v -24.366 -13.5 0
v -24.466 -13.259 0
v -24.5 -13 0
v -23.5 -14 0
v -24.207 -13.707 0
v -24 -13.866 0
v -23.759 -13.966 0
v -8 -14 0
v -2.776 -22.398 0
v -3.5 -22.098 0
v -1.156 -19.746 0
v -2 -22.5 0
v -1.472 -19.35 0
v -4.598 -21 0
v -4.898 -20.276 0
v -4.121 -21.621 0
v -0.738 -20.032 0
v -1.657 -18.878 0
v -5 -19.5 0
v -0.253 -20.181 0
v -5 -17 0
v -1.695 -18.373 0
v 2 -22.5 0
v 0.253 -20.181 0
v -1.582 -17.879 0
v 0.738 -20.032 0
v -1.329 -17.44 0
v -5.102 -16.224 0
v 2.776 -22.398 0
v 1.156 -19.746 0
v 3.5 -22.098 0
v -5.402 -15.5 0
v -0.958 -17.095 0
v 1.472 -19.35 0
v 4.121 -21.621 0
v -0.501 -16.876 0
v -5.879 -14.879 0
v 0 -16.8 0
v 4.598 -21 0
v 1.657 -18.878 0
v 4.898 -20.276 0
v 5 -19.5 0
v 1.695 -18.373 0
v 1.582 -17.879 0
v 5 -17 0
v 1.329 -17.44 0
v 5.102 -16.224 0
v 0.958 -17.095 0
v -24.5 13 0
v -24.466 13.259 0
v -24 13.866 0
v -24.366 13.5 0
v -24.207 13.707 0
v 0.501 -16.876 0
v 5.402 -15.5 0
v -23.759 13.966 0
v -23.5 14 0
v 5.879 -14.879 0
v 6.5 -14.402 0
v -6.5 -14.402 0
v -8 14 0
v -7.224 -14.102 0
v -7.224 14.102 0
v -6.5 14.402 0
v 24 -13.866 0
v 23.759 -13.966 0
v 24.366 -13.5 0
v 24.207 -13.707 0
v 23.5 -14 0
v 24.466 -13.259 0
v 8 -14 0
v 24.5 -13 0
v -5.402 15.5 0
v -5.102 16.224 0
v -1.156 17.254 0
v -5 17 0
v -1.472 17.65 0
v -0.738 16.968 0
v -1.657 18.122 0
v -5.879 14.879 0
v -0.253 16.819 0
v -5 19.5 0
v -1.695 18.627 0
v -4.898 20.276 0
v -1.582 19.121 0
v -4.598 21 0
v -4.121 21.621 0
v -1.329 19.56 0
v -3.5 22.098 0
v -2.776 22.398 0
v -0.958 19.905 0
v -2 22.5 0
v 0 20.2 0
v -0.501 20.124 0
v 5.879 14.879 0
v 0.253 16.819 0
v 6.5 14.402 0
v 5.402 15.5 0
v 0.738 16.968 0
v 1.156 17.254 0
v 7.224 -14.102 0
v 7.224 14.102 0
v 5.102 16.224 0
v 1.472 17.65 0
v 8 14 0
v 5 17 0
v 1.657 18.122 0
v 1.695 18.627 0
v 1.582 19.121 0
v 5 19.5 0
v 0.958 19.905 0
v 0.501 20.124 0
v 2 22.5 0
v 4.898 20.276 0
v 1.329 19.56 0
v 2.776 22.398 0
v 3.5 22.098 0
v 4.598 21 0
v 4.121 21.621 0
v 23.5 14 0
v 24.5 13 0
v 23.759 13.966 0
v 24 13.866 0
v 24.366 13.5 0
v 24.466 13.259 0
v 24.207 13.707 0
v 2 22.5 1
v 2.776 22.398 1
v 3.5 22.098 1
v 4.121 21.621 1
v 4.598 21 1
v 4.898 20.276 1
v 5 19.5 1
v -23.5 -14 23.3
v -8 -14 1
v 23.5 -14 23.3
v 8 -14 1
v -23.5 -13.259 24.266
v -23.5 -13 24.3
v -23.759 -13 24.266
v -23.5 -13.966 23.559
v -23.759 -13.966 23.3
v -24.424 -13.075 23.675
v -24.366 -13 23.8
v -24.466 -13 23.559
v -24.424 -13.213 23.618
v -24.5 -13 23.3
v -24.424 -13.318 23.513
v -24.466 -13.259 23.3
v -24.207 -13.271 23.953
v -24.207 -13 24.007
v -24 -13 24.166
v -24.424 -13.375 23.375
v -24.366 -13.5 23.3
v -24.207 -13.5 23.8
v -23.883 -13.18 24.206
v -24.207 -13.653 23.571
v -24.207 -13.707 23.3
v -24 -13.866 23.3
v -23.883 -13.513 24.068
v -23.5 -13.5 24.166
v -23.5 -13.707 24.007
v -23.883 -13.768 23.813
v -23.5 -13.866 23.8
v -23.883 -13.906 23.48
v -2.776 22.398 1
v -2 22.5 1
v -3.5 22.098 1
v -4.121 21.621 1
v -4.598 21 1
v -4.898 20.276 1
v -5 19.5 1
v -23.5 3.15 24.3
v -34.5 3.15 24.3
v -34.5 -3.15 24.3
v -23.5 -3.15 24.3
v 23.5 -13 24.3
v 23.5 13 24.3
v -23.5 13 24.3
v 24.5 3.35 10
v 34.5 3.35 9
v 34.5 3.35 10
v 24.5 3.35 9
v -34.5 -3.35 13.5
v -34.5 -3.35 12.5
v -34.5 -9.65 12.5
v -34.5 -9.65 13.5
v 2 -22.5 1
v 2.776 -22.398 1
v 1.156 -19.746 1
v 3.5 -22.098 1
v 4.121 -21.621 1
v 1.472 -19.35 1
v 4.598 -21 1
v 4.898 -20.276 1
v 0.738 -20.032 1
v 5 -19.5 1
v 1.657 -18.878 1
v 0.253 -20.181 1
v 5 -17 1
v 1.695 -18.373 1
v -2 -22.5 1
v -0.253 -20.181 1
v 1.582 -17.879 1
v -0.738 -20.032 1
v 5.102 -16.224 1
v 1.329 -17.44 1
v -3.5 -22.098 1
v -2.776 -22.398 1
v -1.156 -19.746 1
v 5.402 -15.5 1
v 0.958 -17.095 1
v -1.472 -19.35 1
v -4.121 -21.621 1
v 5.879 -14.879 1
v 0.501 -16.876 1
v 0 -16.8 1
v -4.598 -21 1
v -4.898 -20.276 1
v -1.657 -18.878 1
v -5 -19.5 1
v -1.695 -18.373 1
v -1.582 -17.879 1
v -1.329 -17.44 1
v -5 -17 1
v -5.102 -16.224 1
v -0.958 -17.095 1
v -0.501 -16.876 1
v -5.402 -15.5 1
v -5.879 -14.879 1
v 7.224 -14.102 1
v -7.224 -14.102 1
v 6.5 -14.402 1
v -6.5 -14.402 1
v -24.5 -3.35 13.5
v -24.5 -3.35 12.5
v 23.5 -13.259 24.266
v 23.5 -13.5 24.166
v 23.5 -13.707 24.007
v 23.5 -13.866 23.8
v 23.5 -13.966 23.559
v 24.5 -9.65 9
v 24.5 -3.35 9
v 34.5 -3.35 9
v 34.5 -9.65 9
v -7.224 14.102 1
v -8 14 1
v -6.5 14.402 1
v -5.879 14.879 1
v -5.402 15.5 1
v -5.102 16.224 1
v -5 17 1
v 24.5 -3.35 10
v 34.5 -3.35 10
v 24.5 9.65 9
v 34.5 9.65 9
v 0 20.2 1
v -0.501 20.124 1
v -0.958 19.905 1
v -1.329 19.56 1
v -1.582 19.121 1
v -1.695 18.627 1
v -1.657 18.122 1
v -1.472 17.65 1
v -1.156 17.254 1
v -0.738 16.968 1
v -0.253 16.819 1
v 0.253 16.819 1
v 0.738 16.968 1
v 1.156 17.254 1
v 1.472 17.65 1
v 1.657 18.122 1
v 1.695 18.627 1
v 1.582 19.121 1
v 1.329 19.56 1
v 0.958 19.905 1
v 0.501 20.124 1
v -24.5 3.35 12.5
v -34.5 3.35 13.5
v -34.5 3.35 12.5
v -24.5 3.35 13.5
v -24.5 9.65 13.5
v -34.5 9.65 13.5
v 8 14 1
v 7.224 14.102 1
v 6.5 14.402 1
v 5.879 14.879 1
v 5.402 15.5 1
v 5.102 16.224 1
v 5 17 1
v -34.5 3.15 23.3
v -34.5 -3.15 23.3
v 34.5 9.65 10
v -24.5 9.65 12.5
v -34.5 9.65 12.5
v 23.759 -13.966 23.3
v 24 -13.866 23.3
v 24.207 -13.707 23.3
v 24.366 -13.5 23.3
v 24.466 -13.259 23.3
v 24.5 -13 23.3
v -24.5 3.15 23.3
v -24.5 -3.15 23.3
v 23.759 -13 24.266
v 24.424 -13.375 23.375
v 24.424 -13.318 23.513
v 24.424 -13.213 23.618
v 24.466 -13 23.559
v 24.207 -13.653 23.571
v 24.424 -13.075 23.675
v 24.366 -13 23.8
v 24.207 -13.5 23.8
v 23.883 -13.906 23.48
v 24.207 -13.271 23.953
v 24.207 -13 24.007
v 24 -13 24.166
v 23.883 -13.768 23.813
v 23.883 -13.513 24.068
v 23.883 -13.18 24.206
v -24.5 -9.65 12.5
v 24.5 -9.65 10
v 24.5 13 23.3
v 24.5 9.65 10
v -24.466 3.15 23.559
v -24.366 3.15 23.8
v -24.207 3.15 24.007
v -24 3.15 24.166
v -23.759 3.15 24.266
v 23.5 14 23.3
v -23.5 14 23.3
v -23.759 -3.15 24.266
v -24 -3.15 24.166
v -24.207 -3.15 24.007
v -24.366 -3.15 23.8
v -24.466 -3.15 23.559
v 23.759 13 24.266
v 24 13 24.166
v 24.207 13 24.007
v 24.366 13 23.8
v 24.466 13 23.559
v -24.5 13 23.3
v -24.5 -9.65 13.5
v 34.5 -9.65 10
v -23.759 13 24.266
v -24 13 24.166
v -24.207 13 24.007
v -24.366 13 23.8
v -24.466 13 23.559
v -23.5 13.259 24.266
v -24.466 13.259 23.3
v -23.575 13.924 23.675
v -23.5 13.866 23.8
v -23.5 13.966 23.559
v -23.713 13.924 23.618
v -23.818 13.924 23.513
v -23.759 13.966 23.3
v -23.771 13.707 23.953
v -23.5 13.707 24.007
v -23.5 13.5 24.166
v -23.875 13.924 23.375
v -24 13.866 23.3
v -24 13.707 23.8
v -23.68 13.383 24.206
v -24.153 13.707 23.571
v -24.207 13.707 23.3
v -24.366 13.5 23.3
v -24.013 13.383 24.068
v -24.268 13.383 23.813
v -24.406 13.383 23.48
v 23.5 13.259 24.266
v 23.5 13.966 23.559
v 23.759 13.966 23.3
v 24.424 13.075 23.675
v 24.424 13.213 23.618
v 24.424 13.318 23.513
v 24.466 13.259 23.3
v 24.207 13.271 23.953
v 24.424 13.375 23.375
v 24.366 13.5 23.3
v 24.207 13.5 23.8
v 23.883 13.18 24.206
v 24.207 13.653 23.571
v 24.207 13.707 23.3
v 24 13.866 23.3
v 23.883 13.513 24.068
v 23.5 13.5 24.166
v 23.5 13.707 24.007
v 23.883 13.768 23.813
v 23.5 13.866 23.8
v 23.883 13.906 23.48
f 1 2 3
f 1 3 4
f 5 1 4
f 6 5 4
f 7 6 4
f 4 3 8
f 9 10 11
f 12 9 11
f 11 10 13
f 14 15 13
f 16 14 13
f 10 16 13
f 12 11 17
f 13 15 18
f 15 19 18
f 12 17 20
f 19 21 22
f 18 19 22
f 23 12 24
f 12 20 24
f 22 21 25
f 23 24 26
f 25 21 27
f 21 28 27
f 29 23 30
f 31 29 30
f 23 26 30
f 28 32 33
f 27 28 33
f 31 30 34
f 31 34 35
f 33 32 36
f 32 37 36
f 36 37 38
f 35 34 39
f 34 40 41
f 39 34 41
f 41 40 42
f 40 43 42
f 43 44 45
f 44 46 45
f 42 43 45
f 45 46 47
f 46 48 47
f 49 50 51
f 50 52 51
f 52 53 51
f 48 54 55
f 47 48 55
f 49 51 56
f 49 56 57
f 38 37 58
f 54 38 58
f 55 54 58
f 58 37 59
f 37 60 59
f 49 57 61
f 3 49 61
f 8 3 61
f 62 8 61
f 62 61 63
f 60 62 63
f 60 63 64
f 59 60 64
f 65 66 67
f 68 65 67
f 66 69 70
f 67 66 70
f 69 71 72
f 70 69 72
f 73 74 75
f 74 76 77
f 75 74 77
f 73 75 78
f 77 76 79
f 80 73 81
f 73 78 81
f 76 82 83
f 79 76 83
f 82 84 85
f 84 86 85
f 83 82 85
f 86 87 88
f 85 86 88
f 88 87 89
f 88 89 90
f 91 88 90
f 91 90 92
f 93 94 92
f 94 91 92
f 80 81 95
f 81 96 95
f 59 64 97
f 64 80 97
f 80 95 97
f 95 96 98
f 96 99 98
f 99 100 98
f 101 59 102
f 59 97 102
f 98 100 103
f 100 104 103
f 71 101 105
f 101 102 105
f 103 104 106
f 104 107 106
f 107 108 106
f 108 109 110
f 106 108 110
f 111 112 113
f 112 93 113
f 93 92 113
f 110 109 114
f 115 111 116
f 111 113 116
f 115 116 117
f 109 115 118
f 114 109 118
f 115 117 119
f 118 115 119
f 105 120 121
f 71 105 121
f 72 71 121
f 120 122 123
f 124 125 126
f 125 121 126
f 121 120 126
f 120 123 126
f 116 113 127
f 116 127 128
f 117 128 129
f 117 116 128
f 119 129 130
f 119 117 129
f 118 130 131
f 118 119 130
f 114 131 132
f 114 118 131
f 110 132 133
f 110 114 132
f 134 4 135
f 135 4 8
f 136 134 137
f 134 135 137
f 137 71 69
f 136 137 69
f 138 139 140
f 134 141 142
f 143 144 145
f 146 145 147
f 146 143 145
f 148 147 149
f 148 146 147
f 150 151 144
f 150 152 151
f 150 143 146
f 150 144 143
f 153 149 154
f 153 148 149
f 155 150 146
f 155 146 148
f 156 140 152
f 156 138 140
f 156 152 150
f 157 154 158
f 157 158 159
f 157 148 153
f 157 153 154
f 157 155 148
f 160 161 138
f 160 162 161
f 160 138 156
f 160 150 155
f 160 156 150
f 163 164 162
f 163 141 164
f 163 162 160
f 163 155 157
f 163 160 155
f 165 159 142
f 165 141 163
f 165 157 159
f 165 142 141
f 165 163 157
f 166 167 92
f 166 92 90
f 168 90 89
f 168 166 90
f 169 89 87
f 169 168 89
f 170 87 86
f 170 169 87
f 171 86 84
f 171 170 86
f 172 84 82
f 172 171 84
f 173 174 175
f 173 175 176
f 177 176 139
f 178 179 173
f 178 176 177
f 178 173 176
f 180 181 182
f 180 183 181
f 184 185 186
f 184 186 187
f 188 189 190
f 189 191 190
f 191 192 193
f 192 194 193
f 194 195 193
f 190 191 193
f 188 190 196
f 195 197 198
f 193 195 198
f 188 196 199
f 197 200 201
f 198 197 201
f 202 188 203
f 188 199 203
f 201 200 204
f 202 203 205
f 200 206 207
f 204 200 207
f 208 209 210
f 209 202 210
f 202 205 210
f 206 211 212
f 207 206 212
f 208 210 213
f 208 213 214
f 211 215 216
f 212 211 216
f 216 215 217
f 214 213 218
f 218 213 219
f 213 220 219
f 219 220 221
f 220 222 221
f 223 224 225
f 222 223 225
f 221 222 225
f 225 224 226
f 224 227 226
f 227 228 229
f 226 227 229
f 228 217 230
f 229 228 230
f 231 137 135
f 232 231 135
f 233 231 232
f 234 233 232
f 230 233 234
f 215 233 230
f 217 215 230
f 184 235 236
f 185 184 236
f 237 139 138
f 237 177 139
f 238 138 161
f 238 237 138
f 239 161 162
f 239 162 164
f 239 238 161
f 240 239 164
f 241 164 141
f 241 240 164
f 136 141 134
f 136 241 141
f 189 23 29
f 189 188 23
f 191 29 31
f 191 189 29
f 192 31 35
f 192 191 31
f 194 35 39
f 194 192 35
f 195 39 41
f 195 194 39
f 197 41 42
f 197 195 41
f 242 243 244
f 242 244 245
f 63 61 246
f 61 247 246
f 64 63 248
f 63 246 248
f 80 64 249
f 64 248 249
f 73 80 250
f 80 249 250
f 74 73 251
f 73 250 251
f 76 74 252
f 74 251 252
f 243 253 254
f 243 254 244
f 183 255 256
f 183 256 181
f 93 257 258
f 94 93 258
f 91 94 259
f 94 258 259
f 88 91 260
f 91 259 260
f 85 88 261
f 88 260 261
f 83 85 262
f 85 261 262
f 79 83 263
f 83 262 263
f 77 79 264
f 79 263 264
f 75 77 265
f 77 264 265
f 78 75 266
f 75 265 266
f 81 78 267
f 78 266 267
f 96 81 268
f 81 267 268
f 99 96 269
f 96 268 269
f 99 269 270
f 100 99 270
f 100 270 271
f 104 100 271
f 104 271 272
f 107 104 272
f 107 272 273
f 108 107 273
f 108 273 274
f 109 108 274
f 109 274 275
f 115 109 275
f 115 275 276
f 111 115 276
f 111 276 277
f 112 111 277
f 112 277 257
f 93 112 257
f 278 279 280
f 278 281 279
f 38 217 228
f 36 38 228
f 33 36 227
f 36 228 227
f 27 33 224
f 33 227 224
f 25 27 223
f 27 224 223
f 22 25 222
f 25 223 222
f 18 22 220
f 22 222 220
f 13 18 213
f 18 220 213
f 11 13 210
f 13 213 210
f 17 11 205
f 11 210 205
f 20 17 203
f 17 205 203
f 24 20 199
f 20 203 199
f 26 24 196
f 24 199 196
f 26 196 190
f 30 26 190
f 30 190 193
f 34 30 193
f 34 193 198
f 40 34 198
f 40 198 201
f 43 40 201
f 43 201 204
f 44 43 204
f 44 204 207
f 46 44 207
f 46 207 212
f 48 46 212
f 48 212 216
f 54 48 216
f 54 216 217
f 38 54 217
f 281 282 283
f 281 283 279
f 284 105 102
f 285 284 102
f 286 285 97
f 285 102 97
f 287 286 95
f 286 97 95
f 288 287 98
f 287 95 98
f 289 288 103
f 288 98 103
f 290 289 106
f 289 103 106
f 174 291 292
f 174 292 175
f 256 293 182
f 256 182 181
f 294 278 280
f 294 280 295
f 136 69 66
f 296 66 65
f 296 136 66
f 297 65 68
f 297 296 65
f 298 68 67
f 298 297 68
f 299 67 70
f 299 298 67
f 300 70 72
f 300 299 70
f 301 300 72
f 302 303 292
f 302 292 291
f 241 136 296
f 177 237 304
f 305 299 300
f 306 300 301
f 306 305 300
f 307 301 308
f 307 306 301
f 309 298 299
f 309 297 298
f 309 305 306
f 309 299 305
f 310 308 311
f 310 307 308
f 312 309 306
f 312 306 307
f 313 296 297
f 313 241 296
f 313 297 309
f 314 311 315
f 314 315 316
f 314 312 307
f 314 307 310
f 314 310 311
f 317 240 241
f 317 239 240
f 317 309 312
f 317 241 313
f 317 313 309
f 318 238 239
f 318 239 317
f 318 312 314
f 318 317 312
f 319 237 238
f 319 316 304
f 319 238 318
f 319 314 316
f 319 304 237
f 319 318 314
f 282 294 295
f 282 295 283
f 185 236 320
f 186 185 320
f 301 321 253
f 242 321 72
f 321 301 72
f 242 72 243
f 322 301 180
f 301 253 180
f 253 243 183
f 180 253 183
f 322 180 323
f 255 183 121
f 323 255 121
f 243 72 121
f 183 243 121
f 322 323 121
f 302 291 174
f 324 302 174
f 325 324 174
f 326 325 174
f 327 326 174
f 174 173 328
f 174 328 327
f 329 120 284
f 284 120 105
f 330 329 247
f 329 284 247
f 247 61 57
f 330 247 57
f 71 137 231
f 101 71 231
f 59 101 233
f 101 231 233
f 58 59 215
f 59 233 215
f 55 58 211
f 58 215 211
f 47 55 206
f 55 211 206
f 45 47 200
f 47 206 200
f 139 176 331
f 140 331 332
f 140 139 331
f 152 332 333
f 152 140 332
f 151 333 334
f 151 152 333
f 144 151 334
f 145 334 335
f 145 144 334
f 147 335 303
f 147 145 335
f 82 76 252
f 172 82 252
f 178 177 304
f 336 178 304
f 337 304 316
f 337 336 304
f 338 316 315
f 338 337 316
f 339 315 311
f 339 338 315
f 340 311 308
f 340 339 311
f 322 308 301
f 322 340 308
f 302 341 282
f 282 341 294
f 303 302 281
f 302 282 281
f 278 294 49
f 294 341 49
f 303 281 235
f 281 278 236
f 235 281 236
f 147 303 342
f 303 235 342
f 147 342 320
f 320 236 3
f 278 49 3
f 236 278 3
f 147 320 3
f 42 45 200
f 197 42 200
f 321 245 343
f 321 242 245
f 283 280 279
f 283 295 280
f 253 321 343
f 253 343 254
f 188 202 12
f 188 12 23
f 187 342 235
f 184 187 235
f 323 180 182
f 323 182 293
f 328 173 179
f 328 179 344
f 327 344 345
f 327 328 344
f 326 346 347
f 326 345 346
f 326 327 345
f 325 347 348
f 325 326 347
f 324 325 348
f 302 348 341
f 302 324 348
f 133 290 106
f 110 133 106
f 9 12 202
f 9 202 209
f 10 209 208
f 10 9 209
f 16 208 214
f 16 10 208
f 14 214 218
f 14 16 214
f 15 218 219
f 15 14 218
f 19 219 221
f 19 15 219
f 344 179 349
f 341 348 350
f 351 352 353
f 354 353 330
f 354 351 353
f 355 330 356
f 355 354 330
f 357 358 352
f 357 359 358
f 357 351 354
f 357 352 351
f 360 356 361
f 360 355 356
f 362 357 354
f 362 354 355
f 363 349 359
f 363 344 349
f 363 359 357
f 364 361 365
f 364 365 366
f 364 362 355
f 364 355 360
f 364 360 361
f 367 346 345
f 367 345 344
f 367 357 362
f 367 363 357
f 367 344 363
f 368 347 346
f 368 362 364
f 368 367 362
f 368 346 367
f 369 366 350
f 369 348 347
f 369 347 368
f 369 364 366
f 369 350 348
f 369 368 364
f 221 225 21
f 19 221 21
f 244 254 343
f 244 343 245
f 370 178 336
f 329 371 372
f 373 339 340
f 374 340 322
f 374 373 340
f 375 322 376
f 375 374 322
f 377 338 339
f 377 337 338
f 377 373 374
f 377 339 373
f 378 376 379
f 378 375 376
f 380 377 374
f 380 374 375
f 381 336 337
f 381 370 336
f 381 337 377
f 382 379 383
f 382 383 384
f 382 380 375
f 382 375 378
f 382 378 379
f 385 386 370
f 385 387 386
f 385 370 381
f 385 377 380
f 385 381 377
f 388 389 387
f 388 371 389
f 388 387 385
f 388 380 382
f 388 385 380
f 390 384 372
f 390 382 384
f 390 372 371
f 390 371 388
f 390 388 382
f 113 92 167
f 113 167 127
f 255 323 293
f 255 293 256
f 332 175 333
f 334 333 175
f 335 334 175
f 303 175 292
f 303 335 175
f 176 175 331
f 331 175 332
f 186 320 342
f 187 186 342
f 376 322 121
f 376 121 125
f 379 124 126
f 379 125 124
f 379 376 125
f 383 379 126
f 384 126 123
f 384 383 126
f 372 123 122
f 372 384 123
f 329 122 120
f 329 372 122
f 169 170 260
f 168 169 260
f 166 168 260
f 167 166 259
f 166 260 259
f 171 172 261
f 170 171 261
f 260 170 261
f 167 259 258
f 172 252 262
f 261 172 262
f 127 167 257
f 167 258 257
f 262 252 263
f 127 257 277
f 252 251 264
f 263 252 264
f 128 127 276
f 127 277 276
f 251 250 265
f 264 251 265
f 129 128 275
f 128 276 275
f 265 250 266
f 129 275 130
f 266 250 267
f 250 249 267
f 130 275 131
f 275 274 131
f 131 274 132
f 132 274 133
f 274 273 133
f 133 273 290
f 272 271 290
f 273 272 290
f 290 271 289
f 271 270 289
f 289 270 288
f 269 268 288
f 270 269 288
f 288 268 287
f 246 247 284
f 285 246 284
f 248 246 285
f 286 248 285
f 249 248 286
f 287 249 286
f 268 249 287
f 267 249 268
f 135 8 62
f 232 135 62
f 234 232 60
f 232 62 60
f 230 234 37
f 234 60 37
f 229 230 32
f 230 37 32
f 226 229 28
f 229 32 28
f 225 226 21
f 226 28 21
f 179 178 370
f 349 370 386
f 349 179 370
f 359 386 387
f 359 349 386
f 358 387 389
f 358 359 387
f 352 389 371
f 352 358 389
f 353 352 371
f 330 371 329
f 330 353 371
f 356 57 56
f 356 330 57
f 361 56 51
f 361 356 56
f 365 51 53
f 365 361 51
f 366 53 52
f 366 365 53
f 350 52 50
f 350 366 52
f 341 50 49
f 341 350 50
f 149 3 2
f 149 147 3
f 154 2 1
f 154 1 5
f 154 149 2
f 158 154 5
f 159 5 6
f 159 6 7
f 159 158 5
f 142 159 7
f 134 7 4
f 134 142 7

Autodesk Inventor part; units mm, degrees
ref_plane "YZ Plane" through (0, 0, 0) normal (1, 0, 0) x (0, 1, 0)
ref_plane "XZ Plane" through (0, 0, 0) normal (0, 1, 0) x (-1, 0, 0)
ref_plane "XY Plane" through (0, 0, 0) normal (0, 0, 1) x (1, 0, 0)
sketch "Sketch1" plane through (0, 0, 0) normal (0, 0, 1) x (1, 0, 0)
  line L0 (-24.5, -14) -> (24.5, -14)
  line L1 (24.5, -14) -> (24.5, 14)
  line L2 (24.5, 14) -> (-24.5, 14)
  line L3 (-24.5, 14) -> (-24.5, -14)
  line L4 (-24.5, -14) -> (24.5, 14) construction
  line L5 (24.5, -14) -> (-24.5, 14) construction
  point P0 (0, 0)
  dimension "d0" = 49
  dimension "d1" = 28
extrude "Extrusion1" add sketch "Sketch1" along normal blind 24.3
sketch "Sketch2" plane through (24.5, -14, 0) normal (1, 0, 0) x (0, 0, -1)
  line L0 (-9, 4.35) -> (-10, 4.35)
  line L1 (-10, 4.35) -> (-10, 10.65)
  line L2 (-10, 10.65) -> (-9, 10.65)
  line L3 (-9, 10.65) -> (-9, 4.35)
  line L4 (-9, 4.35) -> (-10, 10.65) construction
  line L5 (-10, 4.35) -> (-9, 10.65) construction
  line L6 (-9, 17.35) -> (-10, 17.35)
  line L7 (-10, 17.35) -> (-10, 23.65)
  line L8 (-10, 23.65) -> (-9, 23.65)
  line L9 (-9, 23.65) -> (-9, 17.35)
  line L10 (-9, 17.35) -> (-10, 23.65) construction
  line L11 (-10, 17.35) -> (-9, 23.65) construction
  line L12 (-9.5, 7.5) -> (-9.5, 20.5) construction
  line L13 (0, 0) -> (0, 28) construction
  point P0 (0, 14)
  point P1 (-9.5, 14)
  point P2 (0, 14)
  dimension "d4" = 1
  dimension "d5" = 6.3
  dimension "d6" = 6.3
  dimension "d7" = 13
  dimension "d8" = 9
extrude "Extrusion2" add sketch "Sketch2" along normal blind 10
sketch "Sketch3" plane through (-24.5, -14, 0) normal (0, -1, 0) x (1, 0, 0)
  line L0 (19.5, 0) -> (29.5, 0)
  line L1 (29.5, 0) -> (29.5, 1)
  line L2 (29.5, 1) -> (19.5, 1)
  line L3 (19.5, 1) -> (19.5, 0)
  line L4 (0, 0) -> (49, 0) projected
  point P0 (24.5, 0)
  point P1 (24.5, 0)
  point P2 (24.5, 0)
  point P3 (24.5, 0)
  dimension "d11" = 1
  dimension "d12" = 10
extrude "Extrusion3" add sketch "Sketch3" along normal blind 8.5
sketch "Sketch4" plane through (-24.5, 14, 0) normal (0, 1, 0) x (1, 0, 0)
  line L0 (29.5, -1) -> (29.5, 0) projected
  line L1 (29.5, 0) -> (19.5, 0)
  line L2 (19.5, 0) -> (19.5, -1)
  line L3 (19.5, -1) -> (29.5, -1)
  line L4 (29.5, -1) -> (29.5, 0)
  line L5 (49, 0) -> (0, 0) projected
  point P0 (24.5, 0)
  point P1 (24.5, -1)
  point P2 (24.5, 0)
  dimension "d15" = 1
extrude "Extrusion4" add sketch "Sketch4" along normal blind 8.5
sketch "Sketch5" plane through (-24.5, -14, 0) normal (-1, 0, 0) x (0, 0, 1)
  line L0 (12.5, 23.65) -> (13.5, 23.65)
  line L1 (13.5, 23.65) -> (13.5, 17.35)
  line L2 (13.5, 17.35) -> (12.5, 17.35)
  line L3 (12.5, 17.35) -> (12.5, 23.65)
  line L4 (12.5, 23.65) -> (13.5, 17.35) construction
  line L5 (13.5, 23.65) -> (12.5, 17.35) construction
  line L6 (12.5, 4.35) -> (13.5, 4.35)
  line L7 (13.5, 4.35) -> (13.5, 10.65)
  line L8 (13.5, 10.65) -> (12.5, 10.65)
  line L9 (12.5, 10.65) -> (12.5, 4.35)
  line L10 (12.5, 4.35) -> (13.5, 10.65) construction
  line L11 (13.5, 4.35) -> (12.5, 10.65) construction
  line L12 (13, 20.5) -> (13, 7.5) construction
  line L13 (0, 28) -> (0, 0) construction
  point P0 (0, 14)
  point P1 (13, 14)
  point P2 (0, 14)
  dimension "d18" = 1
  dimension "d19" = 6.3
  dimension "d20" = 6.3
  dimension "d21" = 13
  dimension "d22" = 13
extrude "Extrusion5" add sketch "Sketch5" along normal blind 10
sketch "Sketch6" plane through (-24.5, -14, 0) normal (-1, 0, 0) x (0, 0, 1)
  line L0 (23.3, 17.15) -> (24.3, 17.15)
  line L1 (24.3, 17.15) -> (24.3, 10.85)
  line L2 (24.3, 10.85) -> (23.3, 10.85)
  line L3 (23.3, 10.85) -> (23.3, 17.15)
  line L4 (23.3, 17.15) -> (24.3, 10.85) construction
  line L5 (24.3, 17.15) -> (23.3, 10.85) construction
  line L6 (0, 28) -> (0, 0) projected
  point P0 (0, 14)
  point P1 (23.8, 14)
  point P2 (23.8, 14)
  point P3 (0, 14)
  point P4 (24.3, 28)
  dimension "d25" = 1
  dimension "d26" = 6.3
extrude "Extrusion6" add sketch "Sketch6" along normal blind 10
fillet "Fillet1" radius 1 9 edges at (0, -14, 24.3) (-24.5, -8.575, 24.3) (-24.5, 8.575, 24.3) (-24.5, 14, 12.15) (0, 14, 24.3) (-24.5, -14, 12.15) (24.5, -14, 12.15) (24.5, 0, 24.3) (24.5, 14, 12.15)
fillet "Fillet2" radius 3 8 edges at (5, -14, 0.5) (5, -22.5, 0.5) (-5, -22.5, 0.5) (-5, -14, 0.5) (-5, 14, 0.5) (-5, 22.5, 0.5) (5, 14, 0.5) (5, 22.5, 0.5)
sketch "Sketch7" plane through (0, 0, 0) normal (0, 0, -1) x (-1, 0, 0)
  line L0 (0, 18.5) -> (0, -18.5) construction
  point P0 (0, 0)
  point P1 (0, 0)
  dimension "d31" = 37
hole "Hole1" at (0, 18.5, 0) at (0, -18.5, 0) direction (0, 0, 1) diameter 3.4 depth 8 tip angle 118 clearance for "Countersunk Flat Head Screw DIN EN ISO 2009" size "M3" standard "DIN"
properties part number "Netzfilter" material "Aluminum 6061"
